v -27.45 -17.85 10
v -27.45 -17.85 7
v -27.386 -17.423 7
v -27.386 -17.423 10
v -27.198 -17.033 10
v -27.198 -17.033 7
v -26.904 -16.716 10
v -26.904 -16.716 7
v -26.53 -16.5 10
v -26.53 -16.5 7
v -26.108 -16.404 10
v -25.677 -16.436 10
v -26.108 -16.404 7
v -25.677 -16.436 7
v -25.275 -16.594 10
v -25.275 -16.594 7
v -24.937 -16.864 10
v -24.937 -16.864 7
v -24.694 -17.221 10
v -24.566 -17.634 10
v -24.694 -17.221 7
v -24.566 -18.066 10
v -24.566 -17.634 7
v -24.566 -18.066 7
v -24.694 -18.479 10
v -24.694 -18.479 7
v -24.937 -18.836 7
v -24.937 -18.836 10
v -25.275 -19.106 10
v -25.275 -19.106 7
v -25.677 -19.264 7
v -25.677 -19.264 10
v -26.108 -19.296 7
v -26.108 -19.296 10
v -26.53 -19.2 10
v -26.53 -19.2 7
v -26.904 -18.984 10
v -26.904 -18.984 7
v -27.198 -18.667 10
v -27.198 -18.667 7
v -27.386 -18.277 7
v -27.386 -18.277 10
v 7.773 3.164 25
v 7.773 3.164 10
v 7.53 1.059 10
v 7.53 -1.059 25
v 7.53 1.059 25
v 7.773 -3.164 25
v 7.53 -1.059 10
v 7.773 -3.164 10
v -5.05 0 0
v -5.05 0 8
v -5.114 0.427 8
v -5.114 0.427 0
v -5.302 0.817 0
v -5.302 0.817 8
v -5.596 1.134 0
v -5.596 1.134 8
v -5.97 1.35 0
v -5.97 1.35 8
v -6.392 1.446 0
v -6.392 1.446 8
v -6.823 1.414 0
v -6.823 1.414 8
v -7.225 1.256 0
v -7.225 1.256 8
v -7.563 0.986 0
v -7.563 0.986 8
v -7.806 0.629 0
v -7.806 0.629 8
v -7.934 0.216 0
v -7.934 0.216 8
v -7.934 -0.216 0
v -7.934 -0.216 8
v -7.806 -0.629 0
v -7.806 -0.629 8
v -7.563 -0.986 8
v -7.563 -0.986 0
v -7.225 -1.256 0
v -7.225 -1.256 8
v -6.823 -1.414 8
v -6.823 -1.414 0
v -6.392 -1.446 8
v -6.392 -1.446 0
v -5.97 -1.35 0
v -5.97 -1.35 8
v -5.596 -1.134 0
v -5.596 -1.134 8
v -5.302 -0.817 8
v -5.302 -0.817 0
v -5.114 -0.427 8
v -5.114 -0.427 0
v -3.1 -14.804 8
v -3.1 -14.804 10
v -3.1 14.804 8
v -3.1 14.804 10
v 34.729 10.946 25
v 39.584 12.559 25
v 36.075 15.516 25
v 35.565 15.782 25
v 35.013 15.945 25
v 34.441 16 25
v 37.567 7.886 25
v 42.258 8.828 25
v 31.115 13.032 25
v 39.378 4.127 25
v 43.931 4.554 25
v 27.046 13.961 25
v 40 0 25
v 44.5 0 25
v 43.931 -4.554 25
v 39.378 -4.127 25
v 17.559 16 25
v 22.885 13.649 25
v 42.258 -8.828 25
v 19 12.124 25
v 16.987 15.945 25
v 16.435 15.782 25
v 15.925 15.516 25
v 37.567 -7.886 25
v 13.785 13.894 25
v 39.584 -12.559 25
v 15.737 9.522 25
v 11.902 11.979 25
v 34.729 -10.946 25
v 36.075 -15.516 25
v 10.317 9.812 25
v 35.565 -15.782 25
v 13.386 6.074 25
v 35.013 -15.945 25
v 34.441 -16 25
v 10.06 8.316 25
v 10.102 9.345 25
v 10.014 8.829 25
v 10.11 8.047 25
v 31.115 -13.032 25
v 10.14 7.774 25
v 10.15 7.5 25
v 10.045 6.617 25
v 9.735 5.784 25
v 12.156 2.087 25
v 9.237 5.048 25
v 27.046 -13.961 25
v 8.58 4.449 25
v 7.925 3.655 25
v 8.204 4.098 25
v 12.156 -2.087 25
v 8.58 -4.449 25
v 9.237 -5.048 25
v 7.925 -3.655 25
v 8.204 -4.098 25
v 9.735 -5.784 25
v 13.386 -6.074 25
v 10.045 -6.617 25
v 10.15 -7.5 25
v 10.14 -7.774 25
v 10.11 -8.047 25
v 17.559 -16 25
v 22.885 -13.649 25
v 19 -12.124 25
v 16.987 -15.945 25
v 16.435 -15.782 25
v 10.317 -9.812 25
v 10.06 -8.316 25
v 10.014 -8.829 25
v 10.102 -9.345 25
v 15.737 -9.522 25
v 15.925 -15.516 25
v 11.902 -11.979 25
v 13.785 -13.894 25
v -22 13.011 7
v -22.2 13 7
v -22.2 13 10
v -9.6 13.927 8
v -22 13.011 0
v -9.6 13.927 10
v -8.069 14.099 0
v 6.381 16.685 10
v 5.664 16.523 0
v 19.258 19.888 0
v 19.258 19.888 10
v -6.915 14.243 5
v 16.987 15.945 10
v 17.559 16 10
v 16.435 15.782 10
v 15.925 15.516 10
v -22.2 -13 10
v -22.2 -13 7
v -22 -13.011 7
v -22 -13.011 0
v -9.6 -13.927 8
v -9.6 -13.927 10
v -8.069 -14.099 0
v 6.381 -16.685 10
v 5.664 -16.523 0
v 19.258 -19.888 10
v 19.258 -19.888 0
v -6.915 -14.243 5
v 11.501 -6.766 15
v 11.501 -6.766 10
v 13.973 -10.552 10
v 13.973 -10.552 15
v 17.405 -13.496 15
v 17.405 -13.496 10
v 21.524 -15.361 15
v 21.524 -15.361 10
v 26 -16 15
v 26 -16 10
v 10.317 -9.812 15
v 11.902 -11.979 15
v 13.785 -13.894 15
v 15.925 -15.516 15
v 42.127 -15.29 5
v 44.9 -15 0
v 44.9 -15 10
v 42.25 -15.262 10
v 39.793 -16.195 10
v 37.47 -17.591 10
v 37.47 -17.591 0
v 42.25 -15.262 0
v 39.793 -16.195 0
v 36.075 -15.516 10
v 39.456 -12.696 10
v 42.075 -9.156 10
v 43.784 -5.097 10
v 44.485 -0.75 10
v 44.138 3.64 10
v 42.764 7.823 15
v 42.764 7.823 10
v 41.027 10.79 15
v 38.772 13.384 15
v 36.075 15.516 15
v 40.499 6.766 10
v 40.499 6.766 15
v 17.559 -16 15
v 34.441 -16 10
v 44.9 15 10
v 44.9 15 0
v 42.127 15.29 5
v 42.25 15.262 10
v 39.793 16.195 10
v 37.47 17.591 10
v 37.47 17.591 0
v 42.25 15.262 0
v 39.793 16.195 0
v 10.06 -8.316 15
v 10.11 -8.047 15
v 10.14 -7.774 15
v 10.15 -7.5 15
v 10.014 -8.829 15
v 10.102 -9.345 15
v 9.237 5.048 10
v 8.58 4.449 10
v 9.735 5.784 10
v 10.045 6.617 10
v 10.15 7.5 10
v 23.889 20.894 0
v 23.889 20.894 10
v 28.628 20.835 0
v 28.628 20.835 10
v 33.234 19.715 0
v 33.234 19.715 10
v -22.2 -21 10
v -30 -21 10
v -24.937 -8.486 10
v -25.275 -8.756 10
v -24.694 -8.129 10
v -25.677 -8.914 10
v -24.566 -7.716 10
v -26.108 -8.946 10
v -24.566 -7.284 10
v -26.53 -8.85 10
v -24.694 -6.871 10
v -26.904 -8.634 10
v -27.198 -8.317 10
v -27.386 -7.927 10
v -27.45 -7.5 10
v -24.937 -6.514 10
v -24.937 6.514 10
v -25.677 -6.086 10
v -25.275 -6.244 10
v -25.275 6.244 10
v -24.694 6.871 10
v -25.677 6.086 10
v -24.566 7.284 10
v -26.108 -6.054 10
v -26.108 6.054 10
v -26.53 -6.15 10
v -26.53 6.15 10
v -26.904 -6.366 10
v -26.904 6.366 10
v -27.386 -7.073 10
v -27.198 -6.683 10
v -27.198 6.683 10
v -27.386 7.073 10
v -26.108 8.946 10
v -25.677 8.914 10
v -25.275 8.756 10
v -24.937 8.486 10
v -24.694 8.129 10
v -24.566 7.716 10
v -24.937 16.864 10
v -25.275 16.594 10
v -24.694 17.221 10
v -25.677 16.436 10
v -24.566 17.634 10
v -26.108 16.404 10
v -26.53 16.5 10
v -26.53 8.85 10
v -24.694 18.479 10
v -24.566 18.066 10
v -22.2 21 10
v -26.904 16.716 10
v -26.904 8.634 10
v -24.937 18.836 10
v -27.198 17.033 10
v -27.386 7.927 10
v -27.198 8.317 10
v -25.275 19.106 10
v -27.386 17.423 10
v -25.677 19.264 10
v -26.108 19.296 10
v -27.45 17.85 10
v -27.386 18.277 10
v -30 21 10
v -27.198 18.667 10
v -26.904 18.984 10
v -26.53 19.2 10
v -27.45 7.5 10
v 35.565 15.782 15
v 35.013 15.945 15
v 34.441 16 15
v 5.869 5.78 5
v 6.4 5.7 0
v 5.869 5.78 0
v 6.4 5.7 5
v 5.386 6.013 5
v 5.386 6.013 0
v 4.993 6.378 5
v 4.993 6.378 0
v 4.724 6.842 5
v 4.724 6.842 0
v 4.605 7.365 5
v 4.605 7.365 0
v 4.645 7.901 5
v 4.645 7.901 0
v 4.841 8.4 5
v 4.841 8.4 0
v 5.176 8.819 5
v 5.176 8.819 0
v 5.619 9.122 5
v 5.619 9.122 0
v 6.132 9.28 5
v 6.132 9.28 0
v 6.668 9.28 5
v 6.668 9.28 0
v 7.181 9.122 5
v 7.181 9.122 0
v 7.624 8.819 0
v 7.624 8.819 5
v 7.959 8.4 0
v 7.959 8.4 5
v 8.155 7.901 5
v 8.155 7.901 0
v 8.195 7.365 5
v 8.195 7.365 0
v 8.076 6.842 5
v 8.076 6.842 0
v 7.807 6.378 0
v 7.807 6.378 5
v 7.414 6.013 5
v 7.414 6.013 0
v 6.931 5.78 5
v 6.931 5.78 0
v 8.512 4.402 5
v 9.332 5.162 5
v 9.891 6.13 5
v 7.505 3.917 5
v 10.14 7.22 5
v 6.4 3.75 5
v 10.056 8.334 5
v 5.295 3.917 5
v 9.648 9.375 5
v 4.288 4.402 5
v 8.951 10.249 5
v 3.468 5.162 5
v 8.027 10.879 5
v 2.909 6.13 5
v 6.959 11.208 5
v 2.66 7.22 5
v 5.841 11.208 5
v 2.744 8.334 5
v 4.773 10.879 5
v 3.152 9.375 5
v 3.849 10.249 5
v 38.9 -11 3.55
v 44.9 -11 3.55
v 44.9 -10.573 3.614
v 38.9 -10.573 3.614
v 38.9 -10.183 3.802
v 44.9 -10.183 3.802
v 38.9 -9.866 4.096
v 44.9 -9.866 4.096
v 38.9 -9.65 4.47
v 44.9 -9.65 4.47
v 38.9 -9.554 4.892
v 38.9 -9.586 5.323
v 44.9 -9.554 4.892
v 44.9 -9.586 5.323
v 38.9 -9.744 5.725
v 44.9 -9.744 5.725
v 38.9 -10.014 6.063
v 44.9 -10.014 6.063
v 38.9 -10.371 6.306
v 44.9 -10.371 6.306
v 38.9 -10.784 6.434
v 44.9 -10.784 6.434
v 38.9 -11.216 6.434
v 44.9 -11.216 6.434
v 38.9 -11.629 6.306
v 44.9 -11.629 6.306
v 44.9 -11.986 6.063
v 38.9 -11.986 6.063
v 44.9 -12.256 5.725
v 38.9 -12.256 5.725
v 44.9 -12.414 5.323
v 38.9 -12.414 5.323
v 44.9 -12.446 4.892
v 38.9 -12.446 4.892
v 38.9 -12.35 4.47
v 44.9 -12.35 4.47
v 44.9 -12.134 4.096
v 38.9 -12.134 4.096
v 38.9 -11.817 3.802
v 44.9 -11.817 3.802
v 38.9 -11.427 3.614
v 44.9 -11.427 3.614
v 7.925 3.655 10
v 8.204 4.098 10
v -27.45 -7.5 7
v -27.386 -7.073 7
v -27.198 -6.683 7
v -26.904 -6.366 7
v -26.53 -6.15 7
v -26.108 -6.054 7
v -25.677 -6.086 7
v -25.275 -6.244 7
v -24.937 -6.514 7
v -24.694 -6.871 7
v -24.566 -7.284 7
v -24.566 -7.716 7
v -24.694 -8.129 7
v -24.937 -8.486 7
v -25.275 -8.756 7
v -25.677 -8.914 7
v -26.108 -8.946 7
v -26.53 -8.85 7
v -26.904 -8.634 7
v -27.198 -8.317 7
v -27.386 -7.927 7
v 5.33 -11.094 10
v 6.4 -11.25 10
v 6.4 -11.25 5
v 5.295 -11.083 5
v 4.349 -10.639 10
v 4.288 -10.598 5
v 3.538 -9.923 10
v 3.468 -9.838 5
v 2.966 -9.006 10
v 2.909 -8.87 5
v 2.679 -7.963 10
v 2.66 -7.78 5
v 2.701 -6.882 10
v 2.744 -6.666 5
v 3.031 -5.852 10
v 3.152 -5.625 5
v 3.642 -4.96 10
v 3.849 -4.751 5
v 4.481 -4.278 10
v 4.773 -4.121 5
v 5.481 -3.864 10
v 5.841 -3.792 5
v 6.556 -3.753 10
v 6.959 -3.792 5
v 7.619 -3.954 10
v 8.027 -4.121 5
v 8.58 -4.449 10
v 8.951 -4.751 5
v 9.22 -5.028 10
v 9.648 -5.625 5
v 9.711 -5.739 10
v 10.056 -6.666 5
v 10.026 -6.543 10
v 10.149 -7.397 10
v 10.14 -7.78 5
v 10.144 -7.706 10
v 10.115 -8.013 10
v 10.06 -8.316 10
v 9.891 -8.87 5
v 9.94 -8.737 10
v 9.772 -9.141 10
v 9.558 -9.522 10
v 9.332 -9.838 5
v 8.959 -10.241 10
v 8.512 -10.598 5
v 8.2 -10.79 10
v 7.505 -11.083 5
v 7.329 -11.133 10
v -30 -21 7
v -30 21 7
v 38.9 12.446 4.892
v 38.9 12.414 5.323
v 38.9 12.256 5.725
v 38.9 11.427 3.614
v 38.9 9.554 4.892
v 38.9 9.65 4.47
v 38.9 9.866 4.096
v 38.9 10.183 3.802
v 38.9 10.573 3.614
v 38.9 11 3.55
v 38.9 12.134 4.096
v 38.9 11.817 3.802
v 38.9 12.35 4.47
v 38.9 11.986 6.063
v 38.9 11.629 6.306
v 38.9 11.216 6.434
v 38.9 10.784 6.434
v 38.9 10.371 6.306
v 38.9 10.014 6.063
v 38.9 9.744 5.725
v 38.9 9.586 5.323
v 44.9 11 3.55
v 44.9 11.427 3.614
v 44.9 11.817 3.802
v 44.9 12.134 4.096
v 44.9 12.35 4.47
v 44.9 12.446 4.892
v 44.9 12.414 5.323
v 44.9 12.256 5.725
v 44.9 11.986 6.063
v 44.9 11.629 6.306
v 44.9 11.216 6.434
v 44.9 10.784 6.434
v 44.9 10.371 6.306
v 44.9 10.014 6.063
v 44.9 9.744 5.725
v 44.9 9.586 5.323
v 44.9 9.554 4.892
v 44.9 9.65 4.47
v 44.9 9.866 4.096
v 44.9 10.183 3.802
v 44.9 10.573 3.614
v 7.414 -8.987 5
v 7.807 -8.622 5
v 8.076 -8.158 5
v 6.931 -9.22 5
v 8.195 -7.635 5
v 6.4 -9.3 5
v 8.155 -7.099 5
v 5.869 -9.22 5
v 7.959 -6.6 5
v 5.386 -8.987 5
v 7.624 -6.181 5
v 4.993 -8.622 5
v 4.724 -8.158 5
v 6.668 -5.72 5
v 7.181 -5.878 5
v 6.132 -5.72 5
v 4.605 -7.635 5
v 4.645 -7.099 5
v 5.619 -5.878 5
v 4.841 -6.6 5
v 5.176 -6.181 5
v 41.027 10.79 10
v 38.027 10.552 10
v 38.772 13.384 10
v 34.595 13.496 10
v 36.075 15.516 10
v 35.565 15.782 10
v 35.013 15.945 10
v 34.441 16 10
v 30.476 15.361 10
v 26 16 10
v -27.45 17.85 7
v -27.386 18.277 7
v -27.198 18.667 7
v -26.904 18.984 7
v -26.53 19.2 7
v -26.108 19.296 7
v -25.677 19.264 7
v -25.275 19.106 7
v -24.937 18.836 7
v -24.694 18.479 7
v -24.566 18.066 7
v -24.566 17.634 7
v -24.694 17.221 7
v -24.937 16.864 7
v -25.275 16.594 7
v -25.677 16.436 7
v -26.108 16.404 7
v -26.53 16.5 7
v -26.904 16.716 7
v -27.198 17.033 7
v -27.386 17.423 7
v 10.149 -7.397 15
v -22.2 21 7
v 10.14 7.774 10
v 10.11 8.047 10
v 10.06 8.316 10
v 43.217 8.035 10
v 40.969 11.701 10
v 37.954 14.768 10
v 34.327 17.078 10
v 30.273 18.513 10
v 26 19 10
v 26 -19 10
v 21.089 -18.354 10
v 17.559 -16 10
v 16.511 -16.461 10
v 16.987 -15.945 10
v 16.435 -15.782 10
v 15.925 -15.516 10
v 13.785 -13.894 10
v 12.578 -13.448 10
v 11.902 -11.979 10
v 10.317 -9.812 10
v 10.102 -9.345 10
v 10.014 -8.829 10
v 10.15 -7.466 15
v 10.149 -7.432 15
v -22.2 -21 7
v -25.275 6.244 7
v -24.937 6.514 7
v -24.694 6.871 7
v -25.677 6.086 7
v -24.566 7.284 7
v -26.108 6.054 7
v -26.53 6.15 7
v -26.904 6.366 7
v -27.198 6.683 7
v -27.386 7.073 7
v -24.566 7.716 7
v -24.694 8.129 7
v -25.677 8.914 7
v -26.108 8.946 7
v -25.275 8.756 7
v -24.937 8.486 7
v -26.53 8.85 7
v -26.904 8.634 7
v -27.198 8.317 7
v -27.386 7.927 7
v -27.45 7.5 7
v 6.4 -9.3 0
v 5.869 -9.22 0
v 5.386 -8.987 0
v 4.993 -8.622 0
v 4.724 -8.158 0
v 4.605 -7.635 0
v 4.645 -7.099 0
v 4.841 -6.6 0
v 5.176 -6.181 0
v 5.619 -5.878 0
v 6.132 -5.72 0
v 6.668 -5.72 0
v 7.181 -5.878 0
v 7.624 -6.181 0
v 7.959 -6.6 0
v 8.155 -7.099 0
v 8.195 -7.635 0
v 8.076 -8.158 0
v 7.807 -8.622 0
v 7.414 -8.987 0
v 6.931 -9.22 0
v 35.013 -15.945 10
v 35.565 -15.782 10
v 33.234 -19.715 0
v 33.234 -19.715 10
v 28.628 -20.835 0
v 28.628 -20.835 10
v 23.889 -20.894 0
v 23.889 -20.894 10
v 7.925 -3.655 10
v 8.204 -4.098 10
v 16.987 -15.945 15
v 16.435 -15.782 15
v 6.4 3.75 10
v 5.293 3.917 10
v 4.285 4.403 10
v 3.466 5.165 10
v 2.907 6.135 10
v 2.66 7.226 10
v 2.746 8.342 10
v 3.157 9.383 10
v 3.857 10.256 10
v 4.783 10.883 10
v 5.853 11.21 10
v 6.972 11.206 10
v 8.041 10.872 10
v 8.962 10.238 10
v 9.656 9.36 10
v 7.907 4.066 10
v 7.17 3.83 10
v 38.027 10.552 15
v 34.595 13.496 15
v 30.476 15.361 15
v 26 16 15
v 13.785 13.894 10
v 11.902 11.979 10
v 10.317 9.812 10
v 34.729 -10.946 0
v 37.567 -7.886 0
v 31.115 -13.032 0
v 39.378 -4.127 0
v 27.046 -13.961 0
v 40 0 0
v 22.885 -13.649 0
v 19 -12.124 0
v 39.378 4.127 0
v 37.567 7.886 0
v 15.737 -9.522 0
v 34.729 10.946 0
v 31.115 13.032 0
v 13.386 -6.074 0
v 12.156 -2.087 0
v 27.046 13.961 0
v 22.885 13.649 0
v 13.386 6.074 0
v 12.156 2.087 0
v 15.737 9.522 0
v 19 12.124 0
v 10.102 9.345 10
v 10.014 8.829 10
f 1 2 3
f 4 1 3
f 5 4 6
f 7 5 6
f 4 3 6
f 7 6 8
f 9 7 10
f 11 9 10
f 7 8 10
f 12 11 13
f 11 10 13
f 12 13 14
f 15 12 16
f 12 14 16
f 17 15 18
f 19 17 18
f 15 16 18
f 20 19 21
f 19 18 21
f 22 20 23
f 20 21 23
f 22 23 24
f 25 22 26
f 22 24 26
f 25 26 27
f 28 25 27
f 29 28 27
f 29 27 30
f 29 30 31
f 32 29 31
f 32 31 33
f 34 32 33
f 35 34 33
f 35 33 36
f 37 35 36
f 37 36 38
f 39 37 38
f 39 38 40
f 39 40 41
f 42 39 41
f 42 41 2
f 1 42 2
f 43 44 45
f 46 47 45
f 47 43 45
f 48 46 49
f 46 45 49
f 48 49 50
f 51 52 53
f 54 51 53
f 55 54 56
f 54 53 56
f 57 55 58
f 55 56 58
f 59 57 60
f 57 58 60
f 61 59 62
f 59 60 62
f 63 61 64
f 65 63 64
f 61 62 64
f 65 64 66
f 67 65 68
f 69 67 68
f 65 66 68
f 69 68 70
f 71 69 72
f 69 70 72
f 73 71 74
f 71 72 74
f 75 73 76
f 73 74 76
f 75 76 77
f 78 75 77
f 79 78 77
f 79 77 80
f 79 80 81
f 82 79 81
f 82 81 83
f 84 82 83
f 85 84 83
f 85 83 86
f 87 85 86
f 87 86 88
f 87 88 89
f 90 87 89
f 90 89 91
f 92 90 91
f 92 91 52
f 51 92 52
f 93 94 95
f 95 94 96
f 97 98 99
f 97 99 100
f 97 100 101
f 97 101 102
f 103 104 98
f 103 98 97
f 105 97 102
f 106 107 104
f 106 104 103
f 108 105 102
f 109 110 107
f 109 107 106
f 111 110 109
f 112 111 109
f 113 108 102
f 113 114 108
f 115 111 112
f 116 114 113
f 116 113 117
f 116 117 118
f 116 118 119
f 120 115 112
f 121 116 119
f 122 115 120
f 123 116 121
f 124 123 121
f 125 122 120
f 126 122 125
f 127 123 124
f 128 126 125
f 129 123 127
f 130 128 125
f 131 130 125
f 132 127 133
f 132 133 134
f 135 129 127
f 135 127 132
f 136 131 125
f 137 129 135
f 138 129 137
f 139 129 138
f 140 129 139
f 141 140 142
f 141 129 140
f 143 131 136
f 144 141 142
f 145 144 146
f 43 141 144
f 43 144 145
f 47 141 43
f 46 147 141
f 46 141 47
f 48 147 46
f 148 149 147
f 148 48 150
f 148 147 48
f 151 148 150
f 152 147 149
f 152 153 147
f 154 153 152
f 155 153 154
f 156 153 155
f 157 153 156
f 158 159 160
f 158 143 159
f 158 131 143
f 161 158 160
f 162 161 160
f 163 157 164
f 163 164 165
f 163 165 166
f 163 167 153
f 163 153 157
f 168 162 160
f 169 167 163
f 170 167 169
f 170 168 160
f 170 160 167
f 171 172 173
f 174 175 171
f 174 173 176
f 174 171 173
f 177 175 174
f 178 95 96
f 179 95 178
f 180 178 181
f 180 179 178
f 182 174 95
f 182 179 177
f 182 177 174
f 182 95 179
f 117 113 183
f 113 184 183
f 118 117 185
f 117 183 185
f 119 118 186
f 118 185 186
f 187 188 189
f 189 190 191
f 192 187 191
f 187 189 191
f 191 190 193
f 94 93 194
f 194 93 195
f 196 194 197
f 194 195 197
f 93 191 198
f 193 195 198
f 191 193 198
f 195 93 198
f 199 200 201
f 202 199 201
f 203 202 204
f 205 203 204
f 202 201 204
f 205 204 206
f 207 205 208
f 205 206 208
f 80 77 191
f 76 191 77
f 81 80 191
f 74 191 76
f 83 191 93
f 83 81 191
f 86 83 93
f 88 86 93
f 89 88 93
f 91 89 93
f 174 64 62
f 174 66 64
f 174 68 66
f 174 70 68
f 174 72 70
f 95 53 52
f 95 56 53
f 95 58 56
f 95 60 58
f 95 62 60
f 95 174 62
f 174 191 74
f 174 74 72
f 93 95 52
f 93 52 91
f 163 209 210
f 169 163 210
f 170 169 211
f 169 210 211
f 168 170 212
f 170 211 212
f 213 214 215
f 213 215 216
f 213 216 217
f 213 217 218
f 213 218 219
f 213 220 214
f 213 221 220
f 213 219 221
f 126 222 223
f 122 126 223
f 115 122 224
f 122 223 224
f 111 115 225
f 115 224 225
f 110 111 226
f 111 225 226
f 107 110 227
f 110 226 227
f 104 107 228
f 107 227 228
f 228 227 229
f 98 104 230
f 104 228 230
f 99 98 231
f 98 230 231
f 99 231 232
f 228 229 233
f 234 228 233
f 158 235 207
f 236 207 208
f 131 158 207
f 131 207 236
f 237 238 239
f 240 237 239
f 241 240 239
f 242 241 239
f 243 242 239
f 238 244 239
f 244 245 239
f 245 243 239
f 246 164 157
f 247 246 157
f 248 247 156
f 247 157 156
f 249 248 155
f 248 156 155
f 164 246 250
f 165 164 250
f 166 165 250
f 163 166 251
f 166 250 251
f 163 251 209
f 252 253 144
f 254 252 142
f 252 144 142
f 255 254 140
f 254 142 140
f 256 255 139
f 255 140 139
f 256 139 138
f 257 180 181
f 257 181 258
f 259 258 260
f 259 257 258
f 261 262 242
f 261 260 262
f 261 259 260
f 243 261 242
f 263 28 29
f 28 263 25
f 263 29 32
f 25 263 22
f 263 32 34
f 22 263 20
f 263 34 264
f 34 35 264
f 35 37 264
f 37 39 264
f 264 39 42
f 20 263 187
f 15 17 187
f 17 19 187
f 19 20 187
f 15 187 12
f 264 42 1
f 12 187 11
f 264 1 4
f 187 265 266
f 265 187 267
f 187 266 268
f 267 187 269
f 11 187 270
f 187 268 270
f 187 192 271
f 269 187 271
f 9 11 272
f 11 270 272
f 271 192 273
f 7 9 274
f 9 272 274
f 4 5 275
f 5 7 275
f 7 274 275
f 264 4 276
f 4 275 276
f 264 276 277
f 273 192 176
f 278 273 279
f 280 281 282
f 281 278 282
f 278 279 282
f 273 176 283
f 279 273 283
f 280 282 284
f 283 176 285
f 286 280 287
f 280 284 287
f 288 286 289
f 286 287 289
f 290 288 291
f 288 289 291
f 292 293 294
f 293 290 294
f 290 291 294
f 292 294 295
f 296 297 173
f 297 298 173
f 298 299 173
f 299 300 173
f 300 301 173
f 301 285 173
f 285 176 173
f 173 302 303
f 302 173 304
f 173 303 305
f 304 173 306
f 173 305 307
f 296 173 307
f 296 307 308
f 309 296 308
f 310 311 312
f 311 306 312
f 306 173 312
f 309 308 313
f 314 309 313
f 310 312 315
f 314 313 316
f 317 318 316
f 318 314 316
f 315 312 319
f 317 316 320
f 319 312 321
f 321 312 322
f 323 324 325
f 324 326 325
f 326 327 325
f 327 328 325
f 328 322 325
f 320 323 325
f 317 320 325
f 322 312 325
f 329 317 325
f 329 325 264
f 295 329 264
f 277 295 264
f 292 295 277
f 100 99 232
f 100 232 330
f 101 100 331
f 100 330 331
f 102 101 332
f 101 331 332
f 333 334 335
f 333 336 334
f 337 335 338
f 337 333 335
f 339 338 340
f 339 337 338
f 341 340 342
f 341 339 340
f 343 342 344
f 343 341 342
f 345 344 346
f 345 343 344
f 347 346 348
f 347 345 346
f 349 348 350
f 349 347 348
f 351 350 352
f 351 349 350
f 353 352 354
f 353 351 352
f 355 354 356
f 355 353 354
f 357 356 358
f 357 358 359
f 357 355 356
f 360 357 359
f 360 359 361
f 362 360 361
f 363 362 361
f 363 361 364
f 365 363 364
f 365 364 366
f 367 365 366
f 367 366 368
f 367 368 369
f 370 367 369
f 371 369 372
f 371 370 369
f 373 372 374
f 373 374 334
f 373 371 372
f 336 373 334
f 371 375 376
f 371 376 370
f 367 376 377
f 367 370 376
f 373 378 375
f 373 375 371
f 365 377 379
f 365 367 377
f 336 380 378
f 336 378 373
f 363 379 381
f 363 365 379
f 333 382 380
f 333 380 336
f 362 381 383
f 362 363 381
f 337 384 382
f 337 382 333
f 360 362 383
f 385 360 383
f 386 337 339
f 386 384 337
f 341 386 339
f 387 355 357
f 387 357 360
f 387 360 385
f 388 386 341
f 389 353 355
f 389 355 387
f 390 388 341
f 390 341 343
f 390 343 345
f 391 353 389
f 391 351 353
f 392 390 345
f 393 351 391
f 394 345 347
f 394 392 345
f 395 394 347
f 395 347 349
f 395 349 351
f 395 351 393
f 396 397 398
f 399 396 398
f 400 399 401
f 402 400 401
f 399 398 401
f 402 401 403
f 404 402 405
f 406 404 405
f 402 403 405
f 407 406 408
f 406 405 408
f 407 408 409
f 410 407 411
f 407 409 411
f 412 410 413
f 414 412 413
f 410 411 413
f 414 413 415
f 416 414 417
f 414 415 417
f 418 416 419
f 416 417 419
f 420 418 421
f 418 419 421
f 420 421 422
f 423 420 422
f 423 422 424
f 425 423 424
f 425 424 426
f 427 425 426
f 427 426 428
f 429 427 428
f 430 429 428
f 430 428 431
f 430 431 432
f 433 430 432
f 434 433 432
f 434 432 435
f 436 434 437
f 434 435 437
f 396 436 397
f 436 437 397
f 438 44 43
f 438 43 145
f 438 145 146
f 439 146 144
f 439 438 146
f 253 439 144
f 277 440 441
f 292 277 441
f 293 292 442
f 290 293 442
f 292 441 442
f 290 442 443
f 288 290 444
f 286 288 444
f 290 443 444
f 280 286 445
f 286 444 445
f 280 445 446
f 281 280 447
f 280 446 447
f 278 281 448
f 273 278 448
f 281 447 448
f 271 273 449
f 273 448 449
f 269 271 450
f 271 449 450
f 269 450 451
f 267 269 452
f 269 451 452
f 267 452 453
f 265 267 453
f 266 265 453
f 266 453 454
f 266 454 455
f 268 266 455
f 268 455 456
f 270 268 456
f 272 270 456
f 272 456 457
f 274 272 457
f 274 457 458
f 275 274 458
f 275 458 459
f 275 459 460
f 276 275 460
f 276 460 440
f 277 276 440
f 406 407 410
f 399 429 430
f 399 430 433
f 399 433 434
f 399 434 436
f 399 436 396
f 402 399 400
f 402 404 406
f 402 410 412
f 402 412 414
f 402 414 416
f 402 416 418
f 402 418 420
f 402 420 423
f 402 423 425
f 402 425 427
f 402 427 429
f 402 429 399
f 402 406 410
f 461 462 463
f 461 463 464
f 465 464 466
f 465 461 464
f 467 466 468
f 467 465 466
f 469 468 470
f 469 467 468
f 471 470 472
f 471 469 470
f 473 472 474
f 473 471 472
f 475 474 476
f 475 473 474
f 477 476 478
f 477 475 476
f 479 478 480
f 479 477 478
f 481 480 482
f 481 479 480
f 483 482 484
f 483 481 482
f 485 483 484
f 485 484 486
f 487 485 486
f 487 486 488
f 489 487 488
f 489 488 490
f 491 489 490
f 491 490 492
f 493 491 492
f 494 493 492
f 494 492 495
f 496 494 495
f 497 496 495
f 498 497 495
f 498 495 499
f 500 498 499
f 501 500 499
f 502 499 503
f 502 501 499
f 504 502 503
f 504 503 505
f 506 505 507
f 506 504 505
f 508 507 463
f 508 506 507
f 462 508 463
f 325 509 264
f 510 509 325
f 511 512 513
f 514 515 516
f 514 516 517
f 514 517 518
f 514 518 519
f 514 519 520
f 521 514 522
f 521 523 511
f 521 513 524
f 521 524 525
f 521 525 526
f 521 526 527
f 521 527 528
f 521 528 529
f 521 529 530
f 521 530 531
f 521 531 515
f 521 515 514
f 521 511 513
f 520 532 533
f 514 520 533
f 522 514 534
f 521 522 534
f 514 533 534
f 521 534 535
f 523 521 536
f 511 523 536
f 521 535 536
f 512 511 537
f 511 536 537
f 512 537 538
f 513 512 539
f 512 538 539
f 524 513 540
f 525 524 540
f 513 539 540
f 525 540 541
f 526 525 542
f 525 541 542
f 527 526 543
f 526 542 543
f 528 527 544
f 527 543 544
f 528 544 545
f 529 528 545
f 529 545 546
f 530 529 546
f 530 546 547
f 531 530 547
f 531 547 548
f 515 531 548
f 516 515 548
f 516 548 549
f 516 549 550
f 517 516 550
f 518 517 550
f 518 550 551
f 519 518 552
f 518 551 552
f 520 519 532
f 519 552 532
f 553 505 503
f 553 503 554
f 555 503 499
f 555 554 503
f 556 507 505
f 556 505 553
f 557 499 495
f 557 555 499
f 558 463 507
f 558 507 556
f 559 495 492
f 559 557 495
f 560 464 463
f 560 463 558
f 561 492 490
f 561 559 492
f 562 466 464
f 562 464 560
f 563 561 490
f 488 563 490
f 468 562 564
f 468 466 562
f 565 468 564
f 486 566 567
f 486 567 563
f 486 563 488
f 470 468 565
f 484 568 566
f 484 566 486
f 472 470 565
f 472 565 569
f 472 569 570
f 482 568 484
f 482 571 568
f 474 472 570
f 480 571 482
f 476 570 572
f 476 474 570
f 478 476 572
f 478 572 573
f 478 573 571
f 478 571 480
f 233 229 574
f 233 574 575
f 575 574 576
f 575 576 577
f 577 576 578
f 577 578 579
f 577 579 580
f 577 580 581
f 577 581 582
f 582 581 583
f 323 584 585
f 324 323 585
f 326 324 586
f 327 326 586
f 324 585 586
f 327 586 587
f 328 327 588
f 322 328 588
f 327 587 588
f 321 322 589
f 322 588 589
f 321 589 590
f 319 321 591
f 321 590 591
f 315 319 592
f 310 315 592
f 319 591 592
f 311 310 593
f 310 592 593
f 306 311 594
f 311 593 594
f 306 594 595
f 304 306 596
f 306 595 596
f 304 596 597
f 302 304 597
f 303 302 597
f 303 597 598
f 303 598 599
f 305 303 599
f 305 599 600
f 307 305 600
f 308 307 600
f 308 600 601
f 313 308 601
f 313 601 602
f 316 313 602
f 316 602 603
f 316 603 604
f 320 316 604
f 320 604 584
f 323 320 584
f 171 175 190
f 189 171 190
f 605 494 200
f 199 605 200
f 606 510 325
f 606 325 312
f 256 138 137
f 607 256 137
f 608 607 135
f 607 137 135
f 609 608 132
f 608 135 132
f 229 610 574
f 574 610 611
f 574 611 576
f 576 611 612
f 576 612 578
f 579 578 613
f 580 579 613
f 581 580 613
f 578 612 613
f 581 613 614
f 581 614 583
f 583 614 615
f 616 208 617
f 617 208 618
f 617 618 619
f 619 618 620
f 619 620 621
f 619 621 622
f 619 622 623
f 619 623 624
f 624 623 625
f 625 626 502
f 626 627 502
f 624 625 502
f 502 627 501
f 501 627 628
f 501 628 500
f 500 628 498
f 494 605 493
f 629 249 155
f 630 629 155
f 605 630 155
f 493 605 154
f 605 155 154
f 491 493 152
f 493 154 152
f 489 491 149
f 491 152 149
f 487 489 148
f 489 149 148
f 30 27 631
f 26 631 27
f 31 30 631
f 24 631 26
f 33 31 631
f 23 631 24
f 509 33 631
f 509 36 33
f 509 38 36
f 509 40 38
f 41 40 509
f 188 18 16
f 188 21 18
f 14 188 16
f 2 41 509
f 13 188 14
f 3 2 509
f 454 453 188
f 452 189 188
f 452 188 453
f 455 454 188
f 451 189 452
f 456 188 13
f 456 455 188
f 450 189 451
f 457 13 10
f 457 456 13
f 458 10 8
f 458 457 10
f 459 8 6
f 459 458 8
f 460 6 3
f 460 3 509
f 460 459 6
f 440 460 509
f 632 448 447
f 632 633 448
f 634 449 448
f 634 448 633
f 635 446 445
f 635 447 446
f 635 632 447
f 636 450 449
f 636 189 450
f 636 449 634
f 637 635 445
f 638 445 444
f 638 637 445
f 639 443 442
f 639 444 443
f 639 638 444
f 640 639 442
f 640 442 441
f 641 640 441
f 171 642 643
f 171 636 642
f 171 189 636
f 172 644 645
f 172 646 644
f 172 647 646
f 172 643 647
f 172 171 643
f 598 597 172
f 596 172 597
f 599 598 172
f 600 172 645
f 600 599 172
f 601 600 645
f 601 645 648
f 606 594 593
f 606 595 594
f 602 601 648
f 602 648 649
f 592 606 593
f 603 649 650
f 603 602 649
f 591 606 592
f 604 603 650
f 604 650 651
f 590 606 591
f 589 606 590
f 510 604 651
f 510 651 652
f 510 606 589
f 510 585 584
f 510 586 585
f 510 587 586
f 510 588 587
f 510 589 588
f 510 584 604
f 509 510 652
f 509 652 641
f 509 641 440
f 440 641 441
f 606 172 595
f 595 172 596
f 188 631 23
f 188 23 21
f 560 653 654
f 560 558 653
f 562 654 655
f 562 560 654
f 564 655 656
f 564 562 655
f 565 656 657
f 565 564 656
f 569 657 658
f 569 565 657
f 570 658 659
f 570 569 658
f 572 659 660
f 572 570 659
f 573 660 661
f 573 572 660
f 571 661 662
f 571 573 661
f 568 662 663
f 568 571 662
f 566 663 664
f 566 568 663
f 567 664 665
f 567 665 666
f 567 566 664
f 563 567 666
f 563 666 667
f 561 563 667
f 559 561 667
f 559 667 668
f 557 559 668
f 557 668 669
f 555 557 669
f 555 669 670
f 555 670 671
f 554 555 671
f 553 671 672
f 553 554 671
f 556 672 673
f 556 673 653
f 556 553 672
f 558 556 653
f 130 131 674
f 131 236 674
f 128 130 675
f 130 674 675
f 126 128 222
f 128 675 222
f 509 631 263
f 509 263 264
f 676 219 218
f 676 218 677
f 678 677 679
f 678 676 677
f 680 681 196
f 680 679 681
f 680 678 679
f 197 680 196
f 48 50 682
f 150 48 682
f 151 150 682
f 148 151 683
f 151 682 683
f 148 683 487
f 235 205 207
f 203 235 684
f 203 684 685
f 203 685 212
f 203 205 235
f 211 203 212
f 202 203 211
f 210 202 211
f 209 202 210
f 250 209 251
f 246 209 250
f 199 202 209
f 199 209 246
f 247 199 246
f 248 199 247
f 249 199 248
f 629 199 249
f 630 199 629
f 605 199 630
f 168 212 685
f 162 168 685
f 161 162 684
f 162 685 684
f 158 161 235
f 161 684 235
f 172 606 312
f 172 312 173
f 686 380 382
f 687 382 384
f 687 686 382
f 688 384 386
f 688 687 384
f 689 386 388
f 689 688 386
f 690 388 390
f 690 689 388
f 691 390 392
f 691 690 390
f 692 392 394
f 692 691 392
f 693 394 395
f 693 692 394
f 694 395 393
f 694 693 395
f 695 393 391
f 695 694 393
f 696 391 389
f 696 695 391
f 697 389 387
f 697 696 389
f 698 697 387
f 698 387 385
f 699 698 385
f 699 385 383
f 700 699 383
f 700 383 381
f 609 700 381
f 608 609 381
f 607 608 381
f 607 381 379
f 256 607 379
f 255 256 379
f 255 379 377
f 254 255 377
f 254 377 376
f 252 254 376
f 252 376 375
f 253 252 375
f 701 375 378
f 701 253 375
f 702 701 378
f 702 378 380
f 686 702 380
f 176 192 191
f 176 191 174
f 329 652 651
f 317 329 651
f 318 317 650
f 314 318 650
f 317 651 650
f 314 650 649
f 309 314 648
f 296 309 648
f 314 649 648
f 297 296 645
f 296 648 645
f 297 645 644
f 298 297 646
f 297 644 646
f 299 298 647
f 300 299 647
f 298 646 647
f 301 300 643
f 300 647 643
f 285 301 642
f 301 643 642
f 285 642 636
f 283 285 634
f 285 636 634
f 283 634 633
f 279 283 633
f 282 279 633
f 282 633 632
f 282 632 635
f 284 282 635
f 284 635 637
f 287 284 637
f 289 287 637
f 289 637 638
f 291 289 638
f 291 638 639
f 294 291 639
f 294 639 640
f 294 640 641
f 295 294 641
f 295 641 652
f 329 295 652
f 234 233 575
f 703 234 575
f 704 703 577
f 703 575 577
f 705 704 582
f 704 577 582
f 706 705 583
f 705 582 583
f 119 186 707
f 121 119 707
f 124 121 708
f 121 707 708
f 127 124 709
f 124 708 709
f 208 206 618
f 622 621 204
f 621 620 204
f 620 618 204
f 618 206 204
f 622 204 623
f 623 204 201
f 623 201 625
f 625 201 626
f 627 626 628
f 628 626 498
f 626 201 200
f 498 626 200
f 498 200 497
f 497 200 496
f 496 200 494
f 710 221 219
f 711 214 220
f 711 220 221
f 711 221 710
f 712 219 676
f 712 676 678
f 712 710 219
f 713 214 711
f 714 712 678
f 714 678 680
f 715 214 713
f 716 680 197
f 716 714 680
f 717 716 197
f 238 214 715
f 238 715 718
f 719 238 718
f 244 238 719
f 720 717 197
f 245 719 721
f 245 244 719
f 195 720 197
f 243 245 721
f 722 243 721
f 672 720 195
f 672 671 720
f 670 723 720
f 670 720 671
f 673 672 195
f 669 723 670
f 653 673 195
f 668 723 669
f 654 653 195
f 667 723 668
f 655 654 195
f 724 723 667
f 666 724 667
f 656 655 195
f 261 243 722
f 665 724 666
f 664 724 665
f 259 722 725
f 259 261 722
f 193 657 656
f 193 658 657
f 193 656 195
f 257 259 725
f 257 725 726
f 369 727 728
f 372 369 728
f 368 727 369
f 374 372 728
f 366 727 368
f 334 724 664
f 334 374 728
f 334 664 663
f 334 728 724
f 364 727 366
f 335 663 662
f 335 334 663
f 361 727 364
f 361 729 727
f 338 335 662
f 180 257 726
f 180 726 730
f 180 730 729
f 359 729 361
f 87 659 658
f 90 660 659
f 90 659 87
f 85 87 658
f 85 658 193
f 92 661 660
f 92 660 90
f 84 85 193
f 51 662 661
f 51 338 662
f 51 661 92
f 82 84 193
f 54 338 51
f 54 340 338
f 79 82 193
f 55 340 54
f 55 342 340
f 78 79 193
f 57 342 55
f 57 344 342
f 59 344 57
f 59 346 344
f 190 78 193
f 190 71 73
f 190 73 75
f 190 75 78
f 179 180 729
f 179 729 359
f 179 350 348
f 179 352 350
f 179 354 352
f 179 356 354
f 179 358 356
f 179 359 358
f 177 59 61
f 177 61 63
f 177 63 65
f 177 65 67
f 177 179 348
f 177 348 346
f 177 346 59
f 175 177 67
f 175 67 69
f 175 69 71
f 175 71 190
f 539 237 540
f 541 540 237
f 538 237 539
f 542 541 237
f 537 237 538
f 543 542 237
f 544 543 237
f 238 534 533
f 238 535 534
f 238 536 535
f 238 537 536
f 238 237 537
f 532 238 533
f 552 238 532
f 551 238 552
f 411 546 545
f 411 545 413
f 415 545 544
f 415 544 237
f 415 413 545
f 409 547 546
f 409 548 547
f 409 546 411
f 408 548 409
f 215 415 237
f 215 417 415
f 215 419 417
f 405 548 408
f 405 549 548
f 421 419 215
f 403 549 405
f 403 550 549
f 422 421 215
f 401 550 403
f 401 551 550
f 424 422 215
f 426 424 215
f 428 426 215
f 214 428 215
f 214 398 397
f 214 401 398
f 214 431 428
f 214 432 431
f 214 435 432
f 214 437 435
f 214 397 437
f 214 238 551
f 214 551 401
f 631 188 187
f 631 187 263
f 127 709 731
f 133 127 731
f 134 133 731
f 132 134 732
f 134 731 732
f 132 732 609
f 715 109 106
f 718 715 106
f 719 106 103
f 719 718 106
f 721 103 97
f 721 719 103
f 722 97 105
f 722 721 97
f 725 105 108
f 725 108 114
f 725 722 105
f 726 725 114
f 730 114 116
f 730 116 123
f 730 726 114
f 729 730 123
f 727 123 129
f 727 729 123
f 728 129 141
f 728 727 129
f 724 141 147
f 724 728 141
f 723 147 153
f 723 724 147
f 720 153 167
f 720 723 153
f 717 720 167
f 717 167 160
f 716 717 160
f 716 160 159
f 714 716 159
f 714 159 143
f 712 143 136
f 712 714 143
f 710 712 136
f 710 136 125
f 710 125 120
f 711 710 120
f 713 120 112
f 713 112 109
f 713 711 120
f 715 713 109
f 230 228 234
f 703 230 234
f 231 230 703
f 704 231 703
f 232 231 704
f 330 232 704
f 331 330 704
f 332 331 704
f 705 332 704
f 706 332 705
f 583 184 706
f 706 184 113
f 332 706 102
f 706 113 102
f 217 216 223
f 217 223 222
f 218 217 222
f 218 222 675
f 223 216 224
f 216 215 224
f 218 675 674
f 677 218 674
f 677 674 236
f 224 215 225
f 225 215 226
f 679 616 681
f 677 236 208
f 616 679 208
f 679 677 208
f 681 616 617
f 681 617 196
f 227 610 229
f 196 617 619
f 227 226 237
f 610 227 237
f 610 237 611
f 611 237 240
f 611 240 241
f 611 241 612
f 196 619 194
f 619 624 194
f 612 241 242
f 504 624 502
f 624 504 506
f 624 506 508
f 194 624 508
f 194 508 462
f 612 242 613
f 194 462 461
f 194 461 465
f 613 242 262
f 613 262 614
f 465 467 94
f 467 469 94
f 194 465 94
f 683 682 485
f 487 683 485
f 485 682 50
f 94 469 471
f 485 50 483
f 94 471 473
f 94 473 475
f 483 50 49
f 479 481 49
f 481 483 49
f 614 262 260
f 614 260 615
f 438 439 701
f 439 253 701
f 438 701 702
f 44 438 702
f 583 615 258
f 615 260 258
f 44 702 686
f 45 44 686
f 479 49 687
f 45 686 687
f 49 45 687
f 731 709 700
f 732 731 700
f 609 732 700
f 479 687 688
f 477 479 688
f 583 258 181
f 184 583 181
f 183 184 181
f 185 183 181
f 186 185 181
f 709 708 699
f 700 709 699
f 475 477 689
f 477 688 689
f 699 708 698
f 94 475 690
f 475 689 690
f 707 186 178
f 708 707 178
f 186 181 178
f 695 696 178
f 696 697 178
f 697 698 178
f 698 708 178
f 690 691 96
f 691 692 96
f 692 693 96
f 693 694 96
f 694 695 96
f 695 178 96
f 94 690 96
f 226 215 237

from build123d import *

# Parameters (mm, degrees)
SKETCH1_R                                     = 14
EXTRUDE1_DEPTH                                = 10
SKETCH3_R                                     = 18.5
SKETCH3_R_2                                   = 14
EXTRUDE2_DEPTH                                = 15
EXTRUDE3_DEPTH                                = 7
CBORE_FOR_M3_PAN_HEAD_MACHINE_SCREW1_AT_COUNT = 2
CBORE_FOR_M3_PAN_HEAD_MACHINE_SCREW1_AT_PITCH = 14.99999999999997
EXTRUDE4_START                                = 20
SKETCH6_R                                     = 3.7499999999999996
EXTRUDE4_DEPTH                                = 20
FILLET1_R                                     = 2
SKETCH8_W                                     = 18.574175621006713
SKETCH8_H                                     = 7.448846743952753
EXTRUDE5_DEPTH                                = 15
FILLET2_R                                     = 3
EXTRUDE8_DEPTH                                = 5
F_2_9_2_9_DIAMETER_HOLE1_D                    = 2.9
F_2_9_2_9_DIAMETER_HOLE1_DEPTH                = 10
SKETCH14_W                                    = 6.5
SKETCH14_H                                    = 44.553858890679976
EXTRUDE9_DEPTH                                = 2
SKETCH15_R                                    = 1.45
EXTRUDE10_DEPTH                               = 10
SKETCH16_R                                    = 1.45
EXTRUDE11_DEPTH                               = 6


with BuildPart() as part:
    # Sketch1 → Extrude1 (new body)
    with BuildSketch(Plane.XY):
        with BuildLine():
            Line((-30, 21), (-22.199999999999996, 21))
            Line((-22.199999999999996, 21), (-22.199999999999996, 13.000000000000002))
            add(Edge.make_bspline(
                [(-22.199999999999996, 13.000000000000002), (-17.087298132677002, 13.293403264574941), (-3.0476406189760237, 14.099098854681937), (10.587905202926116, 17.638075889977564), (19.257911052248826, 19.88829395952834)],
                knots=[0, 0, 0, 0, 0.36416143786510685, 1, 1, 1, 1], degree=3))
            ThreePointArc((19.257911052248826, 19.88829395952834), (28.628449534780575, 20.83485668400702), (37.47030029247324, 17.590685353347904))
            add(Edge.make_bspline(
                [(44.90000000000001, 15), (43.95984253847409, 15.041510539741976), (41.267922149986155, 15.160366234496765), (38.96737663845901, 16.632619120705193), (37.47030029247324, 17.590685353347904)],
                knots=[0, 0, 0, 0, 0.3492515846852426, 1, 1, 1, 1], degree=3))
            Line((44.90000000000001, 15), (44.90000000000001, -15))
            add(Edge.make_bspline(
                [(44.90000000000001, -15), (43.95984253847409, -15.041510539741976), (41.267922149986155, -15.160366234496761), (38.96737663845901, -16.632619120705193), (37.47030029247324, -17.590685353347904)],
                knots=[0, 0, 0, 0, 0.3492515846852426, 1, 1, 1, 1], degree=3))
            ThreePointArc((37.47030029247324, -17.590685353347904), (28.628449534780575, -20.834856684007015), (19.257911052248826, -19.88829395952834))
            add(Edge.make_bspline(
                [(-22.199999999999996, -13.000000000000002), (-17.087298132677002, -13.293403264574941), (-3.0476406189760232, -14.099098854681936), (10.587905202926116, -17.638075889977564), (19.257911052248826, -19.88829395952834)],
                knots=[0, 0, 0, 0, 0.36416143786510685, 1, 1, 1, 1], degree=3))
            Line((-22.199999999999996, -13.000000000000002), (-22.199999999999996, -21))
            Line((-22.199999999999996, -21), (-30, -21))
            Line((-30, -21), (-30, 21))
        make_face()
        with Locations((26.000000000000004, 0)):
            Circle(SKETCH1_R, mode=Mode.SUBTRACT)
    extrude(amount=EXTRUDE1_DEPTH)

    # Sketch3 → Extrude2 (add)
    with BuildSketch(Plane.XY.offset(10)):
        with Locations(Location((26.000000000000004, 0, 0), (0, 0, 180))):
            Circle(SKETCH3_R)
        with Locations((26.000000000000004, 0)):
            Circle(SKETCH3_R_2, mode=Mode.SUBTRACT)
    extrude(amount=EXTRUDE2_DEPTH)

    # Sketch4 → Extrude3 (cut)
    with BuildSketch(Plane(origin=(0, 0, 0), x_dir=(-1, 0, 0), z_dir=(0, 0, -1))):
        Polygon((30, 23.412577815179247), (22, 23.412577815179247), (22.000000000000007, -25.98666339363831), (30.000000000000007, -25.98666339363831), align=None)
    extrude(amount=-EXTRUDE3_DEPTH, mode=Mode.SUBTRACT)

    # Sketch5 → CBORE for M3 Pan Head Machine Screw1 (revolve, cut)
    with BuildSketch(Plane(origin=(6.399999999999998, 7.499999999999986, 10), x_dir=(0, -1, 0), z_dir=(1, 0, 0))):
        Polygon((0, 0), (-2.45e-15, 9.999999999999998), (1.7999999999999978, 10), (1.7999999999999994, 4.999999999999999), (3.749999999999999, 4.999999999999999), (3.75, 0), align=None)
    cbore_for_m3_pan_head_machine_screw1 = revolve(axis=Axis((6.399999999999998, 7.499999999999986, 16.34999999999999), (0, 0, -1)), mode=Mode.SUBTRACT)

    # CBORE for M3 Pan Head Machine Screw1 at: CBORE for M3 Pan Head Machine Screw1 ×2
    with Locations(*[(0, -i * CBORE_FOR_M3_PAN_HEAD_MACHINE_SCREW1_AT_PITCH, 0) for i in range(1, CBORE_FOR_M3_PAN_HEAD_MACHINE_SCREW1_AT_COUNT)]):
        add(cbore_for_m3_pan_head_machine_screw1, mode=Mode.SUBTRACT)

    # Sketch6 → Extrude4 (cut)
    with BuildSketch(Plane.XY.offset(10).offset(EXTRUDE4_START)):
        with Locations((6.399999999999998, 7.499999999999986)):
            Circle(SKETCH6_R)
        with Locations((6.399999999999998, -7.499999999999984)):
            Circle(SKETCH6_R)
    extrude(amount=-EXTRUDE4_DEPTH, mode=Mode.SUBTRACT)

    # Fillet1
    fillet1_edges = [part.edges().sort_by_distance(p)[0] for p in [
        (7.957487706286119, -4.088734539094374, 17.5),
        (9.836860741750934, -9.000162738442441, 17.5),
        (9.836860741750938, 9.000162738442443, 17.5),
        (7.957487706286121, 4.088734539094375, 17.5),
    ]]
    fillet(fillet1_edges, radius=FILLET1_R)

    # Sketch8 → Extrude5 (cut)
    with BuildSketch(Plane.XY.offset(25)):
        with Locations((26, 19.72442337197638)):
            Rectangle(SKETCH8_W, SKETCH8_H)
        with Locations((26, -19.72442337197638)):
            Rectangle(SKETCH8_W, SKETCH8_H)
    extrude(amount=-EXTRUDE5_DEPTH, mode=Mode.SUBTRACT)

    # Fillet2
    fillet2_edges = [part.edges().sort_by_distance(p)[0] for p in [
        (35.28708781050336, 16, 17.5),
        (16.712912189496645, 16, 17.5),
        (35.28708781050336, -16, 17.5),
        (16.712912189496645, -16, 17.5),
    ]]
    fillet(fillet2_edges, radius=FILLET2_R)

    # Sketch11 → Extrude8 (cut)
    with BuildSketch(Plane.XY.offset(10)):
        with BuildLine():
            Line((26.000000000000004, 16.000000000000004), (26.000000000000004, 18.999999999999996))
            ThreePointArc((26.000000000000004, 18.999999999999996), (36.206280080860964, 16.025974132982387), (43.21742953366855, 8.034931253791655))
            Line((43.21742953366855, 8.034931253791655), (40.49888802835247, 6.766257897929818))
            ThreePointArc((40.49888802835247, 6.766257897929818), (34.5947621733566, 13.495557164616752), (26.000000000000004, 16.000000000000004))
        make_face()
        with BuildLine():
            Line((26.000000000000004, -16.000000000000004), (26.000000000000004, -18.999999999999996))
            ThreePointArc((26.000000000000004, -18.999999999999996), (15.793719919139045, -16.025974132982395), (8.782570466331453, -8.034931253791656))
            Line((8.782570466331453, -8.034931253791656), (11.501111971647536, -6.766257897929817))
            ThreePointArc((11.501111971647536, -6.766257897929817), (17.405237826643408, -13.495557164616757), (26.000000000000004, -16.000000000000004))
        make_face()
    extrude(amount=EXTRUDE8_DEPTH, mode=Mode.SUBTRACT)

    # Ø2.9 (2.9) Diameter Hole1
    with Locations(Plane(origin=(-26, -17.85, 10), x_dir=(1, 0, 0), z_dir=(0, 0, 1))):
        with Locations((0, 0), (0, 10.35), (0, 25.35), (0, 35.7)):
            Hole(F_2_9_2_9_DIAMETER_HOLE1_D / 2, depth=F_2_9_2_9_DIAMETER_HOLE1_DEPTH)

    # Sketch14 → Extrude9 (cut)
    with BuildSketch(Plane.XY.offset(10)):
        with Locations((-6.350000000000001, -1.057050154528838)):
            Rectangle(SKETCH14_W, SKETCH14_H)
    extrude(amount=-EXTRUDE9_DEPTH, mode=Mode.SUBTRACT)

    # Sketch15 → Extrude10 (cut)
    with BuildSketch(Plane.XY.offset(8)):
        with Locations((-6.500000000000001, 1.73e-15)):
            Circle(SKETCH15_R)
    extrude(amount=-EXTRUDE10_DEPTH, mode=Mode.SUBTRACT)

    # Sketch16 → Extrude11 (cut)
    with BuildSketch(Plane(origin=(44.90000000000001, 0, 0), x_dir=(0, 0, -1), z_dir=(1, 0, 0))):
        with Locations((-5, -11)):
            Circle(SKETCH16_R)
        with Locations((-5, 11)):
            Circle(SKETCH16_R)
    extrude(amount=-EXTRUDE11_DEPTH, mode=Mode.SUBTRACT)


solid = part.part
